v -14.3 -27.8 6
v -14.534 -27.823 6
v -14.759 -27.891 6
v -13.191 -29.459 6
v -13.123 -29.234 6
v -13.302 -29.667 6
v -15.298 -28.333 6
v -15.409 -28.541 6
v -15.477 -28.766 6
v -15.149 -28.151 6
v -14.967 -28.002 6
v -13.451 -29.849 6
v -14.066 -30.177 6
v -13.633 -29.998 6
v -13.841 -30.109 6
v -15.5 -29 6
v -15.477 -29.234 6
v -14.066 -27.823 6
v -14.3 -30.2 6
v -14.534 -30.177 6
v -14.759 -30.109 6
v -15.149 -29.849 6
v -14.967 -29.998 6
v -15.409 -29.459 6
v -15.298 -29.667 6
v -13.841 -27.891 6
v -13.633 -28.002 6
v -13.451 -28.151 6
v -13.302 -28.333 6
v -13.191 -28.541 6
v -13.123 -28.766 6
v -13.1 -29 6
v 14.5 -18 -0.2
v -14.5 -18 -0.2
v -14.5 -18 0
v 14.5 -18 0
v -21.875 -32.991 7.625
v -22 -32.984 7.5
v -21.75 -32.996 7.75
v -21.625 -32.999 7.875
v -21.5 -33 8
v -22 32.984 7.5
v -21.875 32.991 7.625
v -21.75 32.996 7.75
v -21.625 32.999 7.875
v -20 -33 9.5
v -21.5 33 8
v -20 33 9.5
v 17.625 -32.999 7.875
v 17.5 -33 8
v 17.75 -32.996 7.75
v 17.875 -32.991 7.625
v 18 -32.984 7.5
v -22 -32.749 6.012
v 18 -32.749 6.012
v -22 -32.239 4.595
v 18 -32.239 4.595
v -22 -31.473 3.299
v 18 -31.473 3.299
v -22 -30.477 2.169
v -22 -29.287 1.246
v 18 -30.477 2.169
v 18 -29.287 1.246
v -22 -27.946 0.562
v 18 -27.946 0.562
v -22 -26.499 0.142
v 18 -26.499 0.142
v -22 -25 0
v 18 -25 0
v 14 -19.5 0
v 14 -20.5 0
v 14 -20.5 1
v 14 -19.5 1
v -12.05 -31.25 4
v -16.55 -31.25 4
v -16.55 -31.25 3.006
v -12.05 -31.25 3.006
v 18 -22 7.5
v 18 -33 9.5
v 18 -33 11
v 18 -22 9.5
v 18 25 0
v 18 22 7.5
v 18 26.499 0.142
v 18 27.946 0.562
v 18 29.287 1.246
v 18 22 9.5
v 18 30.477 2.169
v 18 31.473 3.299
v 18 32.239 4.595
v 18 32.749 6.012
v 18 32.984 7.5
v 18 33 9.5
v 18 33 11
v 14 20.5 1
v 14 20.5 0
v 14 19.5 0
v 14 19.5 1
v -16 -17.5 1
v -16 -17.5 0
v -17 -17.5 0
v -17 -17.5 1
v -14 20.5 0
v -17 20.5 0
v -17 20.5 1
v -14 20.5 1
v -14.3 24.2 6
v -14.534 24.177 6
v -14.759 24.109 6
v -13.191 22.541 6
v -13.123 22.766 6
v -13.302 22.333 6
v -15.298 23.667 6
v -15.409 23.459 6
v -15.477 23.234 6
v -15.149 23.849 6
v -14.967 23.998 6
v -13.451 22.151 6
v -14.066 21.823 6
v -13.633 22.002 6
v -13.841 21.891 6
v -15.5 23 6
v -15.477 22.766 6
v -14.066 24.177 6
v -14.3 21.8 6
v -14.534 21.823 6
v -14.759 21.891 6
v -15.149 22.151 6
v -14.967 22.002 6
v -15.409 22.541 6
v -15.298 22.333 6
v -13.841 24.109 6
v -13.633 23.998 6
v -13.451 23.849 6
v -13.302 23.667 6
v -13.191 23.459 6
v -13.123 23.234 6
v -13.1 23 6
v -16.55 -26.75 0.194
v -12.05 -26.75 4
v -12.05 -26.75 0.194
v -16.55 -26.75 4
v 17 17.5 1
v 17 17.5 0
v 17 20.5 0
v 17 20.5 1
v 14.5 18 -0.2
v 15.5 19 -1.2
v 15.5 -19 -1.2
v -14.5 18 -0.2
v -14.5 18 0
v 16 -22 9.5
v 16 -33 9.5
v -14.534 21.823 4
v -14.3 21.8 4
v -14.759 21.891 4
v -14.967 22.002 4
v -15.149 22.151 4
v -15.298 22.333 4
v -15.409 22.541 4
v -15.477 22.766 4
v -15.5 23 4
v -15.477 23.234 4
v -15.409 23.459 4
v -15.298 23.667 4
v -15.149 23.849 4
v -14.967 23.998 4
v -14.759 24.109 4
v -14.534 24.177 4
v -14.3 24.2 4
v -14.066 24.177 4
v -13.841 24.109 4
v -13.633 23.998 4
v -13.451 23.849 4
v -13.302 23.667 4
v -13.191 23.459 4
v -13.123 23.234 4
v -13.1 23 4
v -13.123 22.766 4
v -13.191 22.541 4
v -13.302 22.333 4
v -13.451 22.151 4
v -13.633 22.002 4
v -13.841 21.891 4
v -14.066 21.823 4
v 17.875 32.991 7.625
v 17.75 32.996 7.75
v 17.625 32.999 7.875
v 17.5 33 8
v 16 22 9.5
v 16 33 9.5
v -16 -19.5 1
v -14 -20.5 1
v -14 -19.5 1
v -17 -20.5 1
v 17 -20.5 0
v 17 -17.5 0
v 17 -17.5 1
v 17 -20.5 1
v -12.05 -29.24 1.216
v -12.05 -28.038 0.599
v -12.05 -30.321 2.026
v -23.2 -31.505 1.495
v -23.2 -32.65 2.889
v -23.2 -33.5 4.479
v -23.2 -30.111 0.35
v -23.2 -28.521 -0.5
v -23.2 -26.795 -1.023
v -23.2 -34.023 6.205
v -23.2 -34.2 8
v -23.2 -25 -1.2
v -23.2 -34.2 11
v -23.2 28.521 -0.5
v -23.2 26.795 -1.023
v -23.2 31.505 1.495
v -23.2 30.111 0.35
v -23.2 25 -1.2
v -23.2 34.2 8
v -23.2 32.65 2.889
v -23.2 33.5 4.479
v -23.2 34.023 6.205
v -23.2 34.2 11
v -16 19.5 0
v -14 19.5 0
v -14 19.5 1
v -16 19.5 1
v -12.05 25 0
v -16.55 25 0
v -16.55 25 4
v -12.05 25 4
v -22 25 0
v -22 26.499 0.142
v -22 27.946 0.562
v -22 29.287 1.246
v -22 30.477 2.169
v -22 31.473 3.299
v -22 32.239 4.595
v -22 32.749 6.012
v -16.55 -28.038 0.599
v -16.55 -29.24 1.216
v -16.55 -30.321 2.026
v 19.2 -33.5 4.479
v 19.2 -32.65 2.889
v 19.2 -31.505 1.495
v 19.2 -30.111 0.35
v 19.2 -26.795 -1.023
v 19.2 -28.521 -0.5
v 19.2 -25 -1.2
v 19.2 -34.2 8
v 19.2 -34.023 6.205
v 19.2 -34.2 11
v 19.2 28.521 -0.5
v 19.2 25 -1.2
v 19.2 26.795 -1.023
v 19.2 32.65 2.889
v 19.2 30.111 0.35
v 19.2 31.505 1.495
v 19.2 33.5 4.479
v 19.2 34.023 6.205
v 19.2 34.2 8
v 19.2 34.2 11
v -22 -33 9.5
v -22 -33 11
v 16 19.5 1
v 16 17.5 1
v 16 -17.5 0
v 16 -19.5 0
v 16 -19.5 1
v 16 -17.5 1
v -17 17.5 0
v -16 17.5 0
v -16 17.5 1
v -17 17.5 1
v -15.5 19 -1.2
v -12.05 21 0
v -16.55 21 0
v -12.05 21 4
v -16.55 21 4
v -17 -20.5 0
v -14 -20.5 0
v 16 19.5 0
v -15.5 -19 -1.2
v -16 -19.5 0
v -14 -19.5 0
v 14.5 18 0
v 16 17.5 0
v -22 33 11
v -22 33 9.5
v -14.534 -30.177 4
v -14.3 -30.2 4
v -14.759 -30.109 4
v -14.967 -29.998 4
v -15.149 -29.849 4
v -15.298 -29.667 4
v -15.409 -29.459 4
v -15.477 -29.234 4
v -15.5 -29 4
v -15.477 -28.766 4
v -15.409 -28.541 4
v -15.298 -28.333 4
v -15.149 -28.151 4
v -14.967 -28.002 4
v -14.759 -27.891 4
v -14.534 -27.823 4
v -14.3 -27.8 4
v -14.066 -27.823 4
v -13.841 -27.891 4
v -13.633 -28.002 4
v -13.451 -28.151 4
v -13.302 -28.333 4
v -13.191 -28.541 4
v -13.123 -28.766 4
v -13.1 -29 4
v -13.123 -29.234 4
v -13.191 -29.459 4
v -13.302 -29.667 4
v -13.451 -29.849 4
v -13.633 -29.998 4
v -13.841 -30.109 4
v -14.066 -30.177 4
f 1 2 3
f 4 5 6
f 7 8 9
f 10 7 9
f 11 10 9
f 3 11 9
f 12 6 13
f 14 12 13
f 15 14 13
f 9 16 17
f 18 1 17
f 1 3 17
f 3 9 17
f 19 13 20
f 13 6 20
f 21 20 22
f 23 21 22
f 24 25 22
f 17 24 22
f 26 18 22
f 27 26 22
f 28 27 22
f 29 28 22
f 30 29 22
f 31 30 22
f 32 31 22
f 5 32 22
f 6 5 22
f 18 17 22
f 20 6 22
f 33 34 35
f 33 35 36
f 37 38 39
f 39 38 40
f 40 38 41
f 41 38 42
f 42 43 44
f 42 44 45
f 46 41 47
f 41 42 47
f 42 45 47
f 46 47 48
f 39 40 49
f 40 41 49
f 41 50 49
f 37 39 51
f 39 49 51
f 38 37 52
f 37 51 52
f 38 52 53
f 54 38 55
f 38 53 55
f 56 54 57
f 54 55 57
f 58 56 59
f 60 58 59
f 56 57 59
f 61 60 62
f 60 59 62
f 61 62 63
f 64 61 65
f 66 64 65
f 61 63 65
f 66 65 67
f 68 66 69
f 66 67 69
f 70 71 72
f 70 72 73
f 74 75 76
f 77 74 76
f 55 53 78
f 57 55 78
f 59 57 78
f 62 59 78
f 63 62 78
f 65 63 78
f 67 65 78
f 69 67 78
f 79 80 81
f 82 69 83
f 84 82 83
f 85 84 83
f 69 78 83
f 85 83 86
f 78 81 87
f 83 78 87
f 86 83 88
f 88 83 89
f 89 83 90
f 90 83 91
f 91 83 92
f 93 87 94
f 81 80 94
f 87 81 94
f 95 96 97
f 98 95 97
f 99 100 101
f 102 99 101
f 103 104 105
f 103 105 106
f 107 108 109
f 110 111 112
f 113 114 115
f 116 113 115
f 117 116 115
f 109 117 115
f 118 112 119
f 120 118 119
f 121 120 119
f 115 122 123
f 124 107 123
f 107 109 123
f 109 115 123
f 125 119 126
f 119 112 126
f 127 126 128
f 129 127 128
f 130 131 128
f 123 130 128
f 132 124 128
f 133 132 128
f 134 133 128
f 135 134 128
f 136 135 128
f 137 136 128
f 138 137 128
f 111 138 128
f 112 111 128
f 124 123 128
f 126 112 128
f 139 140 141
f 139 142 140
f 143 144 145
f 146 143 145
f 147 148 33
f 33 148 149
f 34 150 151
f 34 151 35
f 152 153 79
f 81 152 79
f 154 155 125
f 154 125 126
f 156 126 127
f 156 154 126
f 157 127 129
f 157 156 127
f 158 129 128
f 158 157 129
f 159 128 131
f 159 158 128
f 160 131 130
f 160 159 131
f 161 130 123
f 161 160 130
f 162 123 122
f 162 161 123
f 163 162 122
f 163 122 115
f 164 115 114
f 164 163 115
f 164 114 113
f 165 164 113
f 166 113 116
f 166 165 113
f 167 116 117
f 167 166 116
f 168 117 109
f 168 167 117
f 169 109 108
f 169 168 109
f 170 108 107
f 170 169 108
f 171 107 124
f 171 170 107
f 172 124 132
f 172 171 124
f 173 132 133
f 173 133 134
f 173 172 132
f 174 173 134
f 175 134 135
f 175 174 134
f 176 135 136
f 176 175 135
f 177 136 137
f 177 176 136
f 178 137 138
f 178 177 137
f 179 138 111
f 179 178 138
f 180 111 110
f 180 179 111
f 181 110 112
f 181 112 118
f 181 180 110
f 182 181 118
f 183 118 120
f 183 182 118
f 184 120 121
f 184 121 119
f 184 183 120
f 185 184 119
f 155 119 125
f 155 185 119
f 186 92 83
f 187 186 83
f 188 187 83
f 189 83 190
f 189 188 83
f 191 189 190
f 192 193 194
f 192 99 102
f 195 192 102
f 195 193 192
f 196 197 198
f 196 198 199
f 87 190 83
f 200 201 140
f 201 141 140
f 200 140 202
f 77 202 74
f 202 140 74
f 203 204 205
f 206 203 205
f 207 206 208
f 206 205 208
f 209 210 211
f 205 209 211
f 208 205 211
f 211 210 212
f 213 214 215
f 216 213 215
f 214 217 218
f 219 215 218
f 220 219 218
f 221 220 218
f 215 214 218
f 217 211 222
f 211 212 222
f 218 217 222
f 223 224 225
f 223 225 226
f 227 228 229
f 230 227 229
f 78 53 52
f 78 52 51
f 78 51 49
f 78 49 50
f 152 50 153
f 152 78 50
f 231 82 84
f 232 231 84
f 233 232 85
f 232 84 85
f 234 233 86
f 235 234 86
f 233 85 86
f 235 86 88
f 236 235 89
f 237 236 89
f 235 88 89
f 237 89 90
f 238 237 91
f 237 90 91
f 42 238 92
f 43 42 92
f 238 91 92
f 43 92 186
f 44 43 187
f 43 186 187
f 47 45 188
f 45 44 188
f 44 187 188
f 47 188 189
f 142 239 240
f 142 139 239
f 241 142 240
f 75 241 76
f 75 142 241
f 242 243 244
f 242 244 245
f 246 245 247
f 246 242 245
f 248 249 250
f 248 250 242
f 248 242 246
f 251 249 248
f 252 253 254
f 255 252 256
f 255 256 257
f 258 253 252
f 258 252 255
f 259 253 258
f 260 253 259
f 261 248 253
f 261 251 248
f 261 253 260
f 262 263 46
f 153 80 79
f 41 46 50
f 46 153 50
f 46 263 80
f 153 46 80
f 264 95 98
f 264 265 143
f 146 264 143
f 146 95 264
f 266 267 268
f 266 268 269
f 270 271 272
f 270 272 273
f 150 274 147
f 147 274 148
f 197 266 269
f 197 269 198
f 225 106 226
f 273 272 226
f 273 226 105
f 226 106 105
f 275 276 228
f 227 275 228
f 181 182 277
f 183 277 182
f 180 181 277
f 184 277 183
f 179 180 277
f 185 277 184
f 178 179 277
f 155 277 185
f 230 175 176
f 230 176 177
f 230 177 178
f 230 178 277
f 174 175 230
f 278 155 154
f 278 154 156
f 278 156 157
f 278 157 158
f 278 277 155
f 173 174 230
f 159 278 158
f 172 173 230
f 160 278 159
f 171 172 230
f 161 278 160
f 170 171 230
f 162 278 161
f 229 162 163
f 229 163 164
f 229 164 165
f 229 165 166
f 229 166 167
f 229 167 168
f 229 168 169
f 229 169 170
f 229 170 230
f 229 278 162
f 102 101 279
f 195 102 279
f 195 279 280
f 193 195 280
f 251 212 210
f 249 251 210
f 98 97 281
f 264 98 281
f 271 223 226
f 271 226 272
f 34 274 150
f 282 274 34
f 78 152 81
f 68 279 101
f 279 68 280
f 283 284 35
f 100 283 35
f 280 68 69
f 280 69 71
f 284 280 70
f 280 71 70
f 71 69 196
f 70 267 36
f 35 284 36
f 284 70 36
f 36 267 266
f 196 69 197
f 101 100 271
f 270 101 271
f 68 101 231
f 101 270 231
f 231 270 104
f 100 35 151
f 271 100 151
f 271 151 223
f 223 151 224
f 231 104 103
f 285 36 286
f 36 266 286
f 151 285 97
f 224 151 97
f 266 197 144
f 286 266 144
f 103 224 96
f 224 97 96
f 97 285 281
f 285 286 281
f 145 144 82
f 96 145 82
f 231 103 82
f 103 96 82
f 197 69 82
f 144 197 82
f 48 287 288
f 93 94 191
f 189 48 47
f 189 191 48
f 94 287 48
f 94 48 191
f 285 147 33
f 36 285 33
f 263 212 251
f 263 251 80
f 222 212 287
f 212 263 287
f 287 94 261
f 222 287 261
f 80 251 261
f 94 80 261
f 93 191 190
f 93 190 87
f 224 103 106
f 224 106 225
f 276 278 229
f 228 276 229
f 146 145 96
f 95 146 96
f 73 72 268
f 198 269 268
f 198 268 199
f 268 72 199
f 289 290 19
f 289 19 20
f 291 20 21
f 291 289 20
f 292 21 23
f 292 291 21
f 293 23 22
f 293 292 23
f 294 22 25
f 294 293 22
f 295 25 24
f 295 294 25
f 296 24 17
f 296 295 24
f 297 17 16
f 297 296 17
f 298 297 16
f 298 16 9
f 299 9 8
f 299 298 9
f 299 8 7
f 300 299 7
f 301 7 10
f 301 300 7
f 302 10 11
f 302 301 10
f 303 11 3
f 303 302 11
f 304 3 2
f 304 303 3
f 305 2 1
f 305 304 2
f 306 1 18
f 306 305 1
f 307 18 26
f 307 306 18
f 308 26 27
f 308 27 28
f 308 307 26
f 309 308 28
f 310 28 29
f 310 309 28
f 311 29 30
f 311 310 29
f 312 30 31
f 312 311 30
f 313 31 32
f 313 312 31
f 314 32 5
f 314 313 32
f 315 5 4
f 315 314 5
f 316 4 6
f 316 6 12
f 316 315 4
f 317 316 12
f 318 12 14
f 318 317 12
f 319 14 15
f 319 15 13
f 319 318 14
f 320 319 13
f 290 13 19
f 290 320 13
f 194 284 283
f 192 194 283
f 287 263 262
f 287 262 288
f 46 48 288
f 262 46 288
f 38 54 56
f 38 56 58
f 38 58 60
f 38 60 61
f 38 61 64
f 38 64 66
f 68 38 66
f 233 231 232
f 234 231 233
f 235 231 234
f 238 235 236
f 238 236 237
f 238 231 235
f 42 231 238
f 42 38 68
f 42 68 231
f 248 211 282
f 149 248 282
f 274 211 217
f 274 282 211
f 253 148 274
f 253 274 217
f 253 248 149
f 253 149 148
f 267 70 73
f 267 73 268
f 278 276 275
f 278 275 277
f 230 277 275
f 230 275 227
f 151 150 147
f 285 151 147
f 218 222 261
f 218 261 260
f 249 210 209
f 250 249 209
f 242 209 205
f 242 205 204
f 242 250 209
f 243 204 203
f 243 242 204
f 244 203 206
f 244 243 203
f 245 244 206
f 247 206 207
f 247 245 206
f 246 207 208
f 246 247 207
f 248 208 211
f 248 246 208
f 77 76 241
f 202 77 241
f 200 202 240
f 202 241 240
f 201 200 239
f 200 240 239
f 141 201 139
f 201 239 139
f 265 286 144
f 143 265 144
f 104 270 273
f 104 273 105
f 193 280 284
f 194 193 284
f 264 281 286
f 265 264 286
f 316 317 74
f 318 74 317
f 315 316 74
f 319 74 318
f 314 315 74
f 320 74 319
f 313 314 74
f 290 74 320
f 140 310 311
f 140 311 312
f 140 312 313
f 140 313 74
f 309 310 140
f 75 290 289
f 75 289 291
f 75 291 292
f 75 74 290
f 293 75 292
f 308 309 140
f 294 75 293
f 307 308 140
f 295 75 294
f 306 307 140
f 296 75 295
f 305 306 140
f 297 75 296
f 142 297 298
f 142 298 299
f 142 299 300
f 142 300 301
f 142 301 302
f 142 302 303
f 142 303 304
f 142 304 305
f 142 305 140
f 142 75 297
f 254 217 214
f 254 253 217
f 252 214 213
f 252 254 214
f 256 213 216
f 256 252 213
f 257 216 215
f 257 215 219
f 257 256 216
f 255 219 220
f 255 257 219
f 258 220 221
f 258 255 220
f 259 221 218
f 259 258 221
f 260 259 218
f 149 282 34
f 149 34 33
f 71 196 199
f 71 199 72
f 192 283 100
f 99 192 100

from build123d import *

# Parameters (mm, degrees)
PAD_DEPTH          = 18
PAD_DEPTH_BACK     = 22
THICKNESS_T        = 1.2
SKETCH002_W        = 29
SKETCH002_H        = 36
POCKET_DEPTH       = 12.201
CHAMFER_SIZE       = 1
PAD002_DEPTH       = 1
POLARPATTERN_COUNT = 2
PAD007_DEPTH       = 66
PAD008_DEPTH       = 66
SKETCH010_W        = 2
SKETCH010_H        = 44
POCKET001_DEPTH    = 2
SKETCH004_W        = 4
SKETCH004_H        = 4
PAD004_DEPTH       = 2.25
SKETCH006_R        = 1.2
PAD005_DEPTH       = 2
PAD003_DEPTH       = 2.25
PAD003_DEPTH_BACK  = 2.25
SKETCH007_R        = 1.2
PAD006_DEPTH       = 2


with BuildPart() as cuerpoprincipal:
    # Sketch → Pad (new body, two sides)
    with BuildSketch(Plane.YZ) as pad_sk:
        with BuildLine():
            Line((-25, 0), (25, 0))
            ThreePointArc((25, 0), (30.6568542495, 2.3431457505), (33, 8))
            Line((33, 11), (33, 8))
            Line((-33, 11), (33, 11))
            Line((-33, 11), (-33, 8))
            ThreePointArc((-33, 8), (-30.6568542495, 2.3431457505), (-25, 0))
        make_face()
    extrude(amount=PAD_DEPTH)
    extrude(pad_sk.sketch, amount=-PAD_DEPTH_BACK)

    # Thickness
    thickness_openings = [cuerpoprincipal.faces().sort_by_distance(p)[0] for p in [
        (-2, 0, 11),
    ]]
    offset(amount=THICKNESS_T, openings=thickness_openings, kind=Kind.INTERSECTION)

    # Sketch002 (on Face11 of Thickness) → Pocket (cut, through all)
    with BuildSketch(Plane(origin=(0, 0, -1.2), x_dir=(1, 0, 0), z_dir=(0, 0, -1))):
        Rectangle(SKETCH002_W, SKETCH002_H)
    extrude(amount=-POCKET_DEPTH, mode=Mode.SUBTRACT)

    # Chamfer
    chamfer_edges = [cuerpoprincipal.edges().sort_by_distance(p)[0] for p in [
        (0, 18, -1.2),
        (14.5, 0, -1.2),
        (0, -18, -1.2),
        (-14.5, 0, -1.2),
    ]]
    chamfer(chamfer_edges, length=CHAMFER_SIZE)

    # Sketch003 (on Face17 of Chamfer) → Pad002 (join)
    with BuildSketch(Plane.XY):
        Polygon((-17, 20.5), (-14, 20.5), (-14, 19.5), (-16, 19.5), (-16, 17.5), (-17, 17.5), align=None)
    pad002 = extrude(amount=PAD002_DEPTH)

    # PolarPattern: Pad002 ×2 about axis
    polarpattern_axis = Axis((0, 0, 0), (0, 0, 1))
    for i in range(1, POLARPATTERN_COUNT):
        add(pad002.rotate(polarpattern_axis, i * 360 / POLARPATTERN_COUNT))

    # Mirrored: Pad002 across XZ
    add(pad002.mirror(Plane.XZ))

    # Mirrored001: Pad002 across YZ
    add(pad002.mirror(Plane.YZ))

    # Sketch008 (on Face20 of Mirrored001) → Pad007 (join)
    with BuildSketch(Plane.XZ.offset(-33)):
        Polygon((-22, 7.5), (-20, 9.5), (-22, 9.5), align=None)
    extrude(amount=PAD007_DEPTH)

    # Sketch009 (on Face20 of Pad007) → Pad008 (join)
    with BuildSketch(Plane.XZ.offset(-33)):
        Polygon((16, 9.5), (18, 9.5), (18, 7.5), align=None)
    extrude(amount=PAD008_DEPTH)

    # Sketch010 (on Face53 of Pad008) → Pocket001 (cut)
    with BuildSketch(Plane.XY.offset(9.5)):
        with Locations((17, 0)):
            Rectangle(SKETCH010_W, SKETCH010_H)
    extrude(amount=-POCKET001_DEPTH, mode=Mode.SUBTRACT)


with BuildPart() as soportespantallarecto:
    # Sketch004 → Pad004 (new body, symmetric)
    with BuildSketch(Plane.YZ.offset(14.3)):
        with Locations((23, 2)):
            Rectangle(SKETCH004_W, SKETCH004_H)
    extrude(amount=PAD004_DEPTH, both=True)

    # Sketch006 (on Face1 of Pad004) → Pad005 (join)
    with BuildSketch(Plane(origin=(0, 0, 4), x_dir=(0, -1, 0), z_dir=(0, 0, 1))):
        with Locations((-23, 14.3)):
            Circle(SKETCH006_R)
    extrude(amount=PAD005_DEPTH)


with BuildPart() as part_mirroring001:
    # Part__Mirroring001: instance of SoportesPantallaRecto
    add(soportespantallarecto.part.mirror(Plane(origin=(0, 0, 0), x_dir=(0, -1, 0), z_dir=(1, 0, 0))))


with BuildPart() as soportespantallacurvo:
    # Sketch005 → Pad003 (new body, two sides)
    with BuildSketch(Plane.YZ.offset(14.3)) as pad003_sk:
        with BuildLine():
            Line((-31.25, 4), (-26.7500000001, 4))
            Line((-26.7500000001, 4), (-26.7500000001, 0.193752502))
            ThreePointArc((-31.25, 3.0062539111), (-29.2399930477, 1.2160145228), (-26.7500000001, 0.193752502))
            Line((-31.25, 4), (-31.25, 3.0062539111))
        make_face()
    extrude(amount=PAD003_DEPTH)
    extrude(pad003_sk.sketch, amount=-PAD003_DEPTH_BACK)

    # Sketch007 (on Face1 of Pad003) → Pad006 (join)
    with BuildSketch(Plane(origin=(0, 0, 4), x_dir=(0, -1, 0), z_dir=(0, 0, 1))):
        with Locations((29, 14.3)):
            Circle(SKETCH007_R)
    extrude(amount=PAD006_DEPTH)


with BuildPart() as part_mirroring002:
    # Part__Mirroring002: instance of SoportesPantallaCurvo
    add(soportespantallacurvo.part.mirror(Plane(origin=(0, 0, 0), x_dir=(0, -1, 0), z_dir=(1, 0, 0))))


solid = Compound([cuerpoprincipal.part, part_mirroring001.part, part_mirroring002.part])
